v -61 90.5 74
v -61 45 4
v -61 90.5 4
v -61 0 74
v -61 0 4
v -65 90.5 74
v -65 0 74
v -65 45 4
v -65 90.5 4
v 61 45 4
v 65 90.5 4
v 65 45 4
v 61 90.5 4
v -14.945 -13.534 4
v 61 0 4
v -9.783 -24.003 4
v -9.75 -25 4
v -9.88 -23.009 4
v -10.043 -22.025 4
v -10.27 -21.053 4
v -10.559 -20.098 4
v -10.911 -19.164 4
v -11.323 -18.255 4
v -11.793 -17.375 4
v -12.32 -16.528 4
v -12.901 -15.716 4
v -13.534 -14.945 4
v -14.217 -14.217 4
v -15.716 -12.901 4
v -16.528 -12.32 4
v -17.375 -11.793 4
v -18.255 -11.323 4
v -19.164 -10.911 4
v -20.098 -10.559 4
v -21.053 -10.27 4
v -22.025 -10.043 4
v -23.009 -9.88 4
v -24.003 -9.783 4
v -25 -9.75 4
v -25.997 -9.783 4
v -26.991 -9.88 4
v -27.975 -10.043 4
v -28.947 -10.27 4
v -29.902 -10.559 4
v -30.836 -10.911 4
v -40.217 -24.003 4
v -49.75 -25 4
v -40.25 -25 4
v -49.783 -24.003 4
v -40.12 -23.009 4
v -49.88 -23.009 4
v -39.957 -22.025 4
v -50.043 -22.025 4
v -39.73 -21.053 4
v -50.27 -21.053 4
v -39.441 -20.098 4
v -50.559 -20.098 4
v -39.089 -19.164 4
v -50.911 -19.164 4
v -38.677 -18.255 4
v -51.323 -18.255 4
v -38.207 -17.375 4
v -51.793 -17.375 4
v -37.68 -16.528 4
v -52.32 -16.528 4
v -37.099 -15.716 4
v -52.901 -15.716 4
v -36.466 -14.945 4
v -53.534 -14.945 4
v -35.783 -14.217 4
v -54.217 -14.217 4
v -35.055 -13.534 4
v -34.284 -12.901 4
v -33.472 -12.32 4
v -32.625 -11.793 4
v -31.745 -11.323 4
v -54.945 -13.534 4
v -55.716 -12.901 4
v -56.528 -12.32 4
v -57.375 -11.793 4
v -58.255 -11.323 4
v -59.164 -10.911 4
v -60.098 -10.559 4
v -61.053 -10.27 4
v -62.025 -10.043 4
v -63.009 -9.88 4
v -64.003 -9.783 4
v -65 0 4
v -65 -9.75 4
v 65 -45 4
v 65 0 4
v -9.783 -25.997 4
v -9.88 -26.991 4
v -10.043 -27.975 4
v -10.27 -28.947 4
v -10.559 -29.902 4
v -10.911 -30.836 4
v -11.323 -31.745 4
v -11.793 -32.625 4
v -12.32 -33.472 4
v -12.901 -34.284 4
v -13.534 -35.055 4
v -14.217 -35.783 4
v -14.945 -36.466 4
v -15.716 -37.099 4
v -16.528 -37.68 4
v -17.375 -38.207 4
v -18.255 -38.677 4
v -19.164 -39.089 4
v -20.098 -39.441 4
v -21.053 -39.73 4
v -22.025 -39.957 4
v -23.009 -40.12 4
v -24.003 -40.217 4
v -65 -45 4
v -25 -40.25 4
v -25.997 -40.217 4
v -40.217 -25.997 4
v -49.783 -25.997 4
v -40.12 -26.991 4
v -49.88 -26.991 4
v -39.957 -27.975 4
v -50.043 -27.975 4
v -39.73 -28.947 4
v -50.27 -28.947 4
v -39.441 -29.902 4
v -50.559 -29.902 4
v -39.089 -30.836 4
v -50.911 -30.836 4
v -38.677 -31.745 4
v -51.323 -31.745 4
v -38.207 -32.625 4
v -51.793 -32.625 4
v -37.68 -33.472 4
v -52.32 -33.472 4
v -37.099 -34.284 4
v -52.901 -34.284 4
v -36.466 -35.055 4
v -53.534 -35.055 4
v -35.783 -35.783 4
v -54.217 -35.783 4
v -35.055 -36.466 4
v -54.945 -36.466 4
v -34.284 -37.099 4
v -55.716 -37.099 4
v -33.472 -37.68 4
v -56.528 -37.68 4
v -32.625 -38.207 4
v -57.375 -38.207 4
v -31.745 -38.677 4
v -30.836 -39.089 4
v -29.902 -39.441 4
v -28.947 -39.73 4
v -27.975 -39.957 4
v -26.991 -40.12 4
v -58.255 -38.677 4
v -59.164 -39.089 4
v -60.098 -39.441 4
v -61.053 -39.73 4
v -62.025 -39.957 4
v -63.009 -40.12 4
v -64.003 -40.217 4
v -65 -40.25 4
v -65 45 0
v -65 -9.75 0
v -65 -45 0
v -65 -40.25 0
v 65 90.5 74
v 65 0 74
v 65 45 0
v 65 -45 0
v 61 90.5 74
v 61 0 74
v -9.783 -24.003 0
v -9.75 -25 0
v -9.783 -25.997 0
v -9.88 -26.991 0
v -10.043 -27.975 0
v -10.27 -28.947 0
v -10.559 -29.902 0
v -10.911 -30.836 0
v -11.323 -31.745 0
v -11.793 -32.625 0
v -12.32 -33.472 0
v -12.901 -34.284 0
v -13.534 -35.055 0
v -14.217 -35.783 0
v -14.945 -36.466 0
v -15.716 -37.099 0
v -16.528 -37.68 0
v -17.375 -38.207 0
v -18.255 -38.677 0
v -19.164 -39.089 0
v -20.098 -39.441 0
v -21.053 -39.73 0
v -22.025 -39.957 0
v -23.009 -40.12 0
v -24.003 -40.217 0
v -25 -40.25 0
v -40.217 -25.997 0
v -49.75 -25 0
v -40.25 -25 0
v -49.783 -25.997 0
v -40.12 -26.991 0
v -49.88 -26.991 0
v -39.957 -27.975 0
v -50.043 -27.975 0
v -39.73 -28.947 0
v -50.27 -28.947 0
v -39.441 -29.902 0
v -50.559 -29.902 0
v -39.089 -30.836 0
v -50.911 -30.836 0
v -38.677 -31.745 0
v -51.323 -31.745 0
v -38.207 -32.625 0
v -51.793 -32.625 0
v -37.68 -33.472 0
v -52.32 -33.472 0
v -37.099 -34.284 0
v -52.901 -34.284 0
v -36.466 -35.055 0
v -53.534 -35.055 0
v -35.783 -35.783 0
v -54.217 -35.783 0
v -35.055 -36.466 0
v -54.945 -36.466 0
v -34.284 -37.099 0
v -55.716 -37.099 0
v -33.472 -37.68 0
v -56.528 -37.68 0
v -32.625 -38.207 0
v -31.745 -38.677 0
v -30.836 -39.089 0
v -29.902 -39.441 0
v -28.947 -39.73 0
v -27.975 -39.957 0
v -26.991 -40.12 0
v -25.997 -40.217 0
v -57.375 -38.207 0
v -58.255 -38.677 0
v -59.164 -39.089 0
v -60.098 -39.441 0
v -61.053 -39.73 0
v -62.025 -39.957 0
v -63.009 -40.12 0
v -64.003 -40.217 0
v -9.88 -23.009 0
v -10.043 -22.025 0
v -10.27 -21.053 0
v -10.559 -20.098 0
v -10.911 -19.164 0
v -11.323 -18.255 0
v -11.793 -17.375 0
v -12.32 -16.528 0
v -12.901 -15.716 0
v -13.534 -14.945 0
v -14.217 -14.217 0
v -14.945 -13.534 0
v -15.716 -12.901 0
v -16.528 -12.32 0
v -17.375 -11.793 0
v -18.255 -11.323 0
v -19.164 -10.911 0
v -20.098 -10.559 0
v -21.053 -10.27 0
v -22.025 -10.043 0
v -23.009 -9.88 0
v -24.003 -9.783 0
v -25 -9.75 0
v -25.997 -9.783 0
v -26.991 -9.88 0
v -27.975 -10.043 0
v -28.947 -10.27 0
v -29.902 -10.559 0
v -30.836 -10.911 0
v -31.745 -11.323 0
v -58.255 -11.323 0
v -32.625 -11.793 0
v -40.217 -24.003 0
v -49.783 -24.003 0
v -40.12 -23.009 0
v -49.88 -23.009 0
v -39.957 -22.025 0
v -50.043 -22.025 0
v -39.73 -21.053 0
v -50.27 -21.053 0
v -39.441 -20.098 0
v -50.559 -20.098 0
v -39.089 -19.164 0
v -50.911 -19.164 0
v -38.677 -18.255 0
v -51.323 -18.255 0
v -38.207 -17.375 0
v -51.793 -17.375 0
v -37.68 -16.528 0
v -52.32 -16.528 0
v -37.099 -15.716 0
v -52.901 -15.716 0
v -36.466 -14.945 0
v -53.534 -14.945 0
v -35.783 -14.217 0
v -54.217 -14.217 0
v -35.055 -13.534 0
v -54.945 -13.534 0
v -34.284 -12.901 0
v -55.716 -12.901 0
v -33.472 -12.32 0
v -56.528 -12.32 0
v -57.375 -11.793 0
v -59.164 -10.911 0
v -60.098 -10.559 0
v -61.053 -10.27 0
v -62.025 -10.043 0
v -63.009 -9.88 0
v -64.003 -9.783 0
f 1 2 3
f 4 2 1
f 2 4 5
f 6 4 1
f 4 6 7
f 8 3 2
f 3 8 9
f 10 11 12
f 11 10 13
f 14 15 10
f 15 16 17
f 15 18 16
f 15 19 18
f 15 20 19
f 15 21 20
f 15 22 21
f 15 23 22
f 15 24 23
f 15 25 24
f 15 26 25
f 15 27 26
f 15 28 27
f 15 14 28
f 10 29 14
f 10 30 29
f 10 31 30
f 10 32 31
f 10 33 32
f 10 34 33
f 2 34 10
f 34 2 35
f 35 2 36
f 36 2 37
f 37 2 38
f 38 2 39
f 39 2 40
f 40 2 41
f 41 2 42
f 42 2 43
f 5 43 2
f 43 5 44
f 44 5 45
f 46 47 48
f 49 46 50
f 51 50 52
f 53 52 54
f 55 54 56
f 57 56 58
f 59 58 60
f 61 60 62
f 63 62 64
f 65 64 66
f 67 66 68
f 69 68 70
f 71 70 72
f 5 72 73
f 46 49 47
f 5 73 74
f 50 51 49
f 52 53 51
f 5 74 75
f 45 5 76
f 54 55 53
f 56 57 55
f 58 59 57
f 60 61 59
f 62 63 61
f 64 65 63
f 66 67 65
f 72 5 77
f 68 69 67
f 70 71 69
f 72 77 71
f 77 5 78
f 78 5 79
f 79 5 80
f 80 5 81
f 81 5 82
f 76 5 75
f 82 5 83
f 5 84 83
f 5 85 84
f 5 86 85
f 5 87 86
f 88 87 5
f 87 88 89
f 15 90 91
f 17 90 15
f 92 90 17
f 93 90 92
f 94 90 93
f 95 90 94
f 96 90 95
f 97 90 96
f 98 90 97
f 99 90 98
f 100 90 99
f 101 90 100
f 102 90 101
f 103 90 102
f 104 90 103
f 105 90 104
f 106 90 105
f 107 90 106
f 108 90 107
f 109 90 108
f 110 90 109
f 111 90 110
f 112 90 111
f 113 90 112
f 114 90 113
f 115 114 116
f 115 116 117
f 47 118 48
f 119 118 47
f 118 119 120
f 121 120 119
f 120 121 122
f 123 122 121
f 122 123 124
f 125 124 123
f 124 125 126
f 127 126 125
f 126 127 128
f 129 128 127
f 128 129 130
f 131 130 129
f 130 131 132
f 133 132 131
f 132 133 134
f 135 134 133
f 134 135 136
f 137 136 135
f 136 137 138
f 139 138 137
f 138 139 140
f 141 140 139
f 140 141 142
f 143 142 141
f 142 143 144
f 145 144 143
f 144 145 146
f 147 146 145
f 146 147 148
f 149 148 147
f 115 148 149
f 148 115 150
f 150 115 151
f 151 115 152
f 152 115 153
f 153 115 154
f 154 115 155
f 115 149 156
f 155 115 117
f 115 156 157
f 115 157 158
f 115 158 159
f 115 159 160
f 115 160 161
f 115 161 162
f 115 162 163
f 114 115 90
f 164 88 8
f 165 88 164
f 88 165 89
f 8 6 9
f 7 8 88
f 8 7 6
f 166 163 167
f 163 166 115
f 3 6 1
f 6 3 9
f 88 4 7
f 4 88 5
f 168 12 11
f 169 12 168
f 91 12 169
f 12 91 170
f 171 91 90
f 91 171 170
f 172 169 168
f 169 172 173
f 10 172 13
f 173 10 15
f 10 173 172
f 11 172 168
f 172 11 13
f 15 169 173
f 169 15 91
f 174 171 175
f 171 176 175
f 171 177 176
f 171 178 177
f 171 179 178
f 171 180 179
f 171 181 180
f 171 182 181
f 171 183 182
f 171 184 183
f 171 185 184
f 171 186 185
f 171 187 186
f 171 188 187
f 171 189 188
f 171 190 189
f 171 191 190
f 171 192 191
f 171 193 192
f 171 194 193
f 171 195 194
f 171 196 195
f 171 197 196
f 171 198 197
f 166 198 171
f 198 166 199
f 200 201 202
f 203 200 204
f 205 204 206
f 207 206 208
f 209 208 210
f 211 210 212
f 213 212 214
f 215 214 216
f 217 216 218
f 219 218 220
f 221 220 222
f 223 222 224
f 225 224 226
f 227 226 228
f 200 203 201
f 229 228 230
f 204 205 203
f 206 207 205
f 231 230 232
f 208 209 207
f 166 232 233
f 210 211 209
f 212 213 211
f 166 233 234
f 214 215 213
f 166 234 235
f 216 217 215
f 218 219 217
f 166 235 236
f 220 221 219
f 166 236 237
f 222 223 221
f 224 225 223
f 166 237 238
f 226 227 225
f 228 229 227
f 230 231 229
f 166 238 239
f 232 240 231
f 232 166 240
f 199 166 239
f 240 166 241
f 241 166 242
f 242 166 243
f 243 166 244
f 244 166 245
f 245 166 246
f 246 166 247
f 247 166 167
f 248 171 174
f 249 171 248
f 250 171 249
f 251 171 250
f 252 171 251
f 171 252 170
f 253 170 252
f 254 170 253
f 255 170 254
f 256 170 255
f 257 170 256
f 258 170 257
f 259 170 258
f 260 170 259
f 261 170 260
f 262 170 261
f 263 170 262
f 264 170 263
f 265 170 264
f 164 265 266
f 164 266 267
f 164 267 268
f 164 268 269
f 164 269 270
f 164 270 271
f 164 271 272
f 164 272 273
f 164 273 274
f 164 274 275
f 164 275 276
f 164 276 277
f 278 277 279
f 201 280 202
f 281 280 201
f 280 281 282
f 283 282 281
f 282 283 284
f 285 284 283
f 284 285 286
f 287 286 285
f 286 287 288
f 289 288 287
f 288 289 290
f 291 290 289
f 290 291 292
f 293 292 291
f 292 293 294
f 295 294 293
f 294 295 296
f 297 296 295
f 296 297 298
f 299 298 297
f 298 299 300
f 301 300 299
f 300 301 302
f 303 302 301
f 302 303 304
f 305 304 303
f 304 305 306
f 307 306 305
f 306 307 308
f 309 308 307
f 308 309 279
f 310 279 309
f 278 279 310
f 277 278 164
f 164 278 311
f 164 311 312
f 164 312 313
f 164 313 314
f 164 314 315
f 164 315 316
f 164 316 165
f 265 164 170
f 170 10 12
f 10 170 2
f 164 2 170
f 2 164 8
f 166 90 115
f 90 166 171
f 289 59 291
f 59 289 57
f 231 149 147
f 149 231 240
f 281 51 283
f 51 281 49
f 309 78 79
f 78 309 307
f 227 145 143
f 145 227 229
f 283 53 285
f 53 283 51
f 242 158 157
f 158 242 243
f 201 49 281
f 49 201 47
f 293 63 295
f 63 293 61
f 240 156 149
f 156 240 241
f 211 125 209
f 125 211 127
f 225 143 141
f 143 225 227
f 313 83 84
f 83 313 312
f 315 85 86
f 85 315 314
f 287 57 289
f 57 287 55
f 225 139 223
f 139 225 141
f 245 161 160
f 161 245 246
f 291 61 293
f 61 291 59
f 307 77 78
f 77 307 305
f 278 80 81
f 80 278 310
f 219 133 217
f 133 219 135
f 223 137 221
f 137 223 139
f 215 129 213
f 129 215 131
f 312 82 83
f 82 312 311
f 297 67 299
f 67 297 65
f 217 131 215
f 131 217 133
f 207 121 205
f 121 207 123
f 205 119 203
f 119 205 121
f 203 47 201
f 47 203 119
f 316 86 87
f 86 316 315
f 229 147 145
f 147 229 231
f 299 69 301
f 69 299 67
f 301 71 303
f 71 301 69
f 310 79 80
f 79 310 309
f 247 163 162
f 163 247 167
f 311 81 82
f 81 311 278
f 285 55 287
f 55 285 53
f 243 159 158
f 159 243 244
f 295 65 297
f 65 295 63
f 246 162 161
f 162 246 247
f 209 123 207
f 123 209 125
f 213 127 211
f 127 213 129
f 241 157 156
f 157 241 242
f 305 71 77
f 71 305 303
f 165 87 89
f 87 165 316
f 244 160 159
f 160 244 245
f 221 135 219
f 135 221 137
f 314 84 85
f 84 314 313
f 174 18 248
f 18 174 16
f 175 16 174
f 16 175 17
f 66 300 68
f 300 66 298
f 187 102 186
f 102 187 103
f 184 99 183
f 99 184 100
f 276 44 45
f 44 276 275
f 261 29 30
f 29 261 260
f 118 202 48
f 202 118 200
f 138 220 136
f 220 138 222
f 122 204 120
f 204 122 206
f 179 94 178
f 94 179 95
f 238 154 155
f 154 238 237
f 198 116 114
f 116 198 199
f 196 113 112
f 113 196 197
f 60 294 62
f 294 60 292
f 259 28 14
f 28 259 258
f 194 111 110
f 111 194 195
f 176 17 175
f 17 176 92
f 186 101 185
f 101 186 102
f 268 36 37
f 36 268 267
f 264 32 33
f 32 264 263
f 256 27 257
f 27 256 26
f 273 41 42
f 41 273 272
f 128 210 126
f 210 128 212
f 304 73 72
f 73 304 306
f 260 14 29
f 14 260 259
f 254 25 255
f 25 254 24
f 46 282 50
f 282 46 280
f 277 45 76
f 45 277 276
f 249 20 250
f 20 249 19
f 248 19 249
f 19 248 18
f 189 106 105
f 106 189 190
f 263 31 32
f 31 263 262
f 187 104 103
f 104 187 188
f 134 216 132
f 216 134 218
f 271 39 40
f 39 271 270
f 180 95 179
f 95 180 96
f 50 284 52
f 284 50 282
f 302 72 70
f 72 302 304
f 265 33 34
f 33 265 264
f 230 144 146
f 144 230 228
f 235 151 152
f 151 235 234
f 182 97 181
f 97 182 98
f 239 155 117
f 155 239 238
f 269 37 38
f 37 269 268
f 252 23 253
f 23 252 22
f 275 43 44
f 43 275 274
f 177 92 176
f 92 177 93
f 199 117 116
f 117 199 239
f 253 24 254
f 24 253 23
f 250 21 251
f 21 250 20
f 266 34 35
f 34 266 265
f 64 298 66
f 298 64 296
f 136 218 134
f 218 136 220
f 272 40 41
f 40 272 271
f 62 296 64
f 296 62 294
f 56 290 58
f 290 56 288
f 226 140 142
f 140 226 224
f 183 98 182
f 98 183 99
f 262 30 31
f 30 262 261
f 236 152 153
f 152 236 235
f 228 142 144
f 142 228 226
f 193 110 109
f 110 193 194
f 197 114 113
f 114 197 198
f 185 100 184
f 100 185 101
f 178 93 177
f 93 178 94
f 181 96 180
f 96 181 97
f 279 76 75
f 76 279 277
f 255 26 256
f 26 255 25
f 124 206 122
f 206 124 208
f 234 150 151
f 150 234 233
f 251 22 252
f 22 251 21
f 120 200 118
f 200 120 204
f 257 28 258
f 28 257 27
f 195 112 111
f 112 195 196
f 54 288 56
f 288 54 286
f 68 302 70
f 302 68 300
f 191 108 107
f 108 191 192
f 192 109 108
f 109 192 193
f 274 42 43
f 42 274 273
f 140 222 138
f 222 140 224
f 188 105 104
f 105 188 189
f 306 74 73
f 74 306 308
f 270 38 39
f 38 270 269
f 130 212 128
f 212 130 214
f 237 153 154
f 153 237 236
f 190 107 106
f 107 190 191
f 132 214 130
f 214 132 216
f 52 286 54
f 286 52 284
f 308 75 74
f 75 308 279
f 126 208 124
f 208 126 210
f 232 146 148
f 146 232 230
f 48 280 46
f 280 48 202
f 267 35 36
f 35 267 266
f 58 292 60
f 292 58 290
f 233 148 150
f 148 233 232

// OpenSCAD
// 6 x 50 mL conical (Falcon-type) tube rack
// Print orientation: flat plate on bed, walls rising to z = 70
// After printing, flip over so walls stand on the bed and tubes pass through holes

// ---------- Parameters ----------
plate_x      = 130;   // plate length along X (mm)
plate_y      = 90;    // plate width along Y (mm)
plate_t      = 4;     // plate thickness (mm), z = 0 to 4

hole_d       = 30.5;  // through-hole diameter (mm)
hole_nx      = 3;     // holes along X (2 rows)
hole_ny      = 2;     // holes along Y (3 columns)
hole_pitch   = 40;    // centre-to-centre spacing in both directions (mm)

wall_h       = 70;    // wall height from top of plate (mm), z = 4 to 74
wall_t       = 4;     // wall thickness along Y (mm)

eps          = 0.5;   // cutter overshoot past faces (mm)
$fn          = 96;    // circle resolution

// ---------- Model ----------
difference() {
    union() {
        // Flat base plate
        translate([-plate_x/2, -plate_y/2, 0])
            cube([plate_x, plate_y, plate_t]);

        // Two solid walls along the long edges, flush with plate's long edge
        for (sx = [-1, 1])
            translate([sx > 0 ? plate_x/2 - wall_t : -plate_x/2, 0, plate_t])
                cube([wall_t, plate_y + eps, wall_h]);
    }

    // Through-holes, centred on the plate
    for (i = [0 : hole_nx - 1])
        for (j = [0 : hole_ny - 1])
            translate([(i - (hole_nx - 1)/2) * hole_pitch - plate_x/2,
                       (j - (hole_ny - 1)/2) * hole_pitch - plate_y/2,
                       -eps])
                cylinder(d = hole_d, h = plate_t + 2 * eps);
}
